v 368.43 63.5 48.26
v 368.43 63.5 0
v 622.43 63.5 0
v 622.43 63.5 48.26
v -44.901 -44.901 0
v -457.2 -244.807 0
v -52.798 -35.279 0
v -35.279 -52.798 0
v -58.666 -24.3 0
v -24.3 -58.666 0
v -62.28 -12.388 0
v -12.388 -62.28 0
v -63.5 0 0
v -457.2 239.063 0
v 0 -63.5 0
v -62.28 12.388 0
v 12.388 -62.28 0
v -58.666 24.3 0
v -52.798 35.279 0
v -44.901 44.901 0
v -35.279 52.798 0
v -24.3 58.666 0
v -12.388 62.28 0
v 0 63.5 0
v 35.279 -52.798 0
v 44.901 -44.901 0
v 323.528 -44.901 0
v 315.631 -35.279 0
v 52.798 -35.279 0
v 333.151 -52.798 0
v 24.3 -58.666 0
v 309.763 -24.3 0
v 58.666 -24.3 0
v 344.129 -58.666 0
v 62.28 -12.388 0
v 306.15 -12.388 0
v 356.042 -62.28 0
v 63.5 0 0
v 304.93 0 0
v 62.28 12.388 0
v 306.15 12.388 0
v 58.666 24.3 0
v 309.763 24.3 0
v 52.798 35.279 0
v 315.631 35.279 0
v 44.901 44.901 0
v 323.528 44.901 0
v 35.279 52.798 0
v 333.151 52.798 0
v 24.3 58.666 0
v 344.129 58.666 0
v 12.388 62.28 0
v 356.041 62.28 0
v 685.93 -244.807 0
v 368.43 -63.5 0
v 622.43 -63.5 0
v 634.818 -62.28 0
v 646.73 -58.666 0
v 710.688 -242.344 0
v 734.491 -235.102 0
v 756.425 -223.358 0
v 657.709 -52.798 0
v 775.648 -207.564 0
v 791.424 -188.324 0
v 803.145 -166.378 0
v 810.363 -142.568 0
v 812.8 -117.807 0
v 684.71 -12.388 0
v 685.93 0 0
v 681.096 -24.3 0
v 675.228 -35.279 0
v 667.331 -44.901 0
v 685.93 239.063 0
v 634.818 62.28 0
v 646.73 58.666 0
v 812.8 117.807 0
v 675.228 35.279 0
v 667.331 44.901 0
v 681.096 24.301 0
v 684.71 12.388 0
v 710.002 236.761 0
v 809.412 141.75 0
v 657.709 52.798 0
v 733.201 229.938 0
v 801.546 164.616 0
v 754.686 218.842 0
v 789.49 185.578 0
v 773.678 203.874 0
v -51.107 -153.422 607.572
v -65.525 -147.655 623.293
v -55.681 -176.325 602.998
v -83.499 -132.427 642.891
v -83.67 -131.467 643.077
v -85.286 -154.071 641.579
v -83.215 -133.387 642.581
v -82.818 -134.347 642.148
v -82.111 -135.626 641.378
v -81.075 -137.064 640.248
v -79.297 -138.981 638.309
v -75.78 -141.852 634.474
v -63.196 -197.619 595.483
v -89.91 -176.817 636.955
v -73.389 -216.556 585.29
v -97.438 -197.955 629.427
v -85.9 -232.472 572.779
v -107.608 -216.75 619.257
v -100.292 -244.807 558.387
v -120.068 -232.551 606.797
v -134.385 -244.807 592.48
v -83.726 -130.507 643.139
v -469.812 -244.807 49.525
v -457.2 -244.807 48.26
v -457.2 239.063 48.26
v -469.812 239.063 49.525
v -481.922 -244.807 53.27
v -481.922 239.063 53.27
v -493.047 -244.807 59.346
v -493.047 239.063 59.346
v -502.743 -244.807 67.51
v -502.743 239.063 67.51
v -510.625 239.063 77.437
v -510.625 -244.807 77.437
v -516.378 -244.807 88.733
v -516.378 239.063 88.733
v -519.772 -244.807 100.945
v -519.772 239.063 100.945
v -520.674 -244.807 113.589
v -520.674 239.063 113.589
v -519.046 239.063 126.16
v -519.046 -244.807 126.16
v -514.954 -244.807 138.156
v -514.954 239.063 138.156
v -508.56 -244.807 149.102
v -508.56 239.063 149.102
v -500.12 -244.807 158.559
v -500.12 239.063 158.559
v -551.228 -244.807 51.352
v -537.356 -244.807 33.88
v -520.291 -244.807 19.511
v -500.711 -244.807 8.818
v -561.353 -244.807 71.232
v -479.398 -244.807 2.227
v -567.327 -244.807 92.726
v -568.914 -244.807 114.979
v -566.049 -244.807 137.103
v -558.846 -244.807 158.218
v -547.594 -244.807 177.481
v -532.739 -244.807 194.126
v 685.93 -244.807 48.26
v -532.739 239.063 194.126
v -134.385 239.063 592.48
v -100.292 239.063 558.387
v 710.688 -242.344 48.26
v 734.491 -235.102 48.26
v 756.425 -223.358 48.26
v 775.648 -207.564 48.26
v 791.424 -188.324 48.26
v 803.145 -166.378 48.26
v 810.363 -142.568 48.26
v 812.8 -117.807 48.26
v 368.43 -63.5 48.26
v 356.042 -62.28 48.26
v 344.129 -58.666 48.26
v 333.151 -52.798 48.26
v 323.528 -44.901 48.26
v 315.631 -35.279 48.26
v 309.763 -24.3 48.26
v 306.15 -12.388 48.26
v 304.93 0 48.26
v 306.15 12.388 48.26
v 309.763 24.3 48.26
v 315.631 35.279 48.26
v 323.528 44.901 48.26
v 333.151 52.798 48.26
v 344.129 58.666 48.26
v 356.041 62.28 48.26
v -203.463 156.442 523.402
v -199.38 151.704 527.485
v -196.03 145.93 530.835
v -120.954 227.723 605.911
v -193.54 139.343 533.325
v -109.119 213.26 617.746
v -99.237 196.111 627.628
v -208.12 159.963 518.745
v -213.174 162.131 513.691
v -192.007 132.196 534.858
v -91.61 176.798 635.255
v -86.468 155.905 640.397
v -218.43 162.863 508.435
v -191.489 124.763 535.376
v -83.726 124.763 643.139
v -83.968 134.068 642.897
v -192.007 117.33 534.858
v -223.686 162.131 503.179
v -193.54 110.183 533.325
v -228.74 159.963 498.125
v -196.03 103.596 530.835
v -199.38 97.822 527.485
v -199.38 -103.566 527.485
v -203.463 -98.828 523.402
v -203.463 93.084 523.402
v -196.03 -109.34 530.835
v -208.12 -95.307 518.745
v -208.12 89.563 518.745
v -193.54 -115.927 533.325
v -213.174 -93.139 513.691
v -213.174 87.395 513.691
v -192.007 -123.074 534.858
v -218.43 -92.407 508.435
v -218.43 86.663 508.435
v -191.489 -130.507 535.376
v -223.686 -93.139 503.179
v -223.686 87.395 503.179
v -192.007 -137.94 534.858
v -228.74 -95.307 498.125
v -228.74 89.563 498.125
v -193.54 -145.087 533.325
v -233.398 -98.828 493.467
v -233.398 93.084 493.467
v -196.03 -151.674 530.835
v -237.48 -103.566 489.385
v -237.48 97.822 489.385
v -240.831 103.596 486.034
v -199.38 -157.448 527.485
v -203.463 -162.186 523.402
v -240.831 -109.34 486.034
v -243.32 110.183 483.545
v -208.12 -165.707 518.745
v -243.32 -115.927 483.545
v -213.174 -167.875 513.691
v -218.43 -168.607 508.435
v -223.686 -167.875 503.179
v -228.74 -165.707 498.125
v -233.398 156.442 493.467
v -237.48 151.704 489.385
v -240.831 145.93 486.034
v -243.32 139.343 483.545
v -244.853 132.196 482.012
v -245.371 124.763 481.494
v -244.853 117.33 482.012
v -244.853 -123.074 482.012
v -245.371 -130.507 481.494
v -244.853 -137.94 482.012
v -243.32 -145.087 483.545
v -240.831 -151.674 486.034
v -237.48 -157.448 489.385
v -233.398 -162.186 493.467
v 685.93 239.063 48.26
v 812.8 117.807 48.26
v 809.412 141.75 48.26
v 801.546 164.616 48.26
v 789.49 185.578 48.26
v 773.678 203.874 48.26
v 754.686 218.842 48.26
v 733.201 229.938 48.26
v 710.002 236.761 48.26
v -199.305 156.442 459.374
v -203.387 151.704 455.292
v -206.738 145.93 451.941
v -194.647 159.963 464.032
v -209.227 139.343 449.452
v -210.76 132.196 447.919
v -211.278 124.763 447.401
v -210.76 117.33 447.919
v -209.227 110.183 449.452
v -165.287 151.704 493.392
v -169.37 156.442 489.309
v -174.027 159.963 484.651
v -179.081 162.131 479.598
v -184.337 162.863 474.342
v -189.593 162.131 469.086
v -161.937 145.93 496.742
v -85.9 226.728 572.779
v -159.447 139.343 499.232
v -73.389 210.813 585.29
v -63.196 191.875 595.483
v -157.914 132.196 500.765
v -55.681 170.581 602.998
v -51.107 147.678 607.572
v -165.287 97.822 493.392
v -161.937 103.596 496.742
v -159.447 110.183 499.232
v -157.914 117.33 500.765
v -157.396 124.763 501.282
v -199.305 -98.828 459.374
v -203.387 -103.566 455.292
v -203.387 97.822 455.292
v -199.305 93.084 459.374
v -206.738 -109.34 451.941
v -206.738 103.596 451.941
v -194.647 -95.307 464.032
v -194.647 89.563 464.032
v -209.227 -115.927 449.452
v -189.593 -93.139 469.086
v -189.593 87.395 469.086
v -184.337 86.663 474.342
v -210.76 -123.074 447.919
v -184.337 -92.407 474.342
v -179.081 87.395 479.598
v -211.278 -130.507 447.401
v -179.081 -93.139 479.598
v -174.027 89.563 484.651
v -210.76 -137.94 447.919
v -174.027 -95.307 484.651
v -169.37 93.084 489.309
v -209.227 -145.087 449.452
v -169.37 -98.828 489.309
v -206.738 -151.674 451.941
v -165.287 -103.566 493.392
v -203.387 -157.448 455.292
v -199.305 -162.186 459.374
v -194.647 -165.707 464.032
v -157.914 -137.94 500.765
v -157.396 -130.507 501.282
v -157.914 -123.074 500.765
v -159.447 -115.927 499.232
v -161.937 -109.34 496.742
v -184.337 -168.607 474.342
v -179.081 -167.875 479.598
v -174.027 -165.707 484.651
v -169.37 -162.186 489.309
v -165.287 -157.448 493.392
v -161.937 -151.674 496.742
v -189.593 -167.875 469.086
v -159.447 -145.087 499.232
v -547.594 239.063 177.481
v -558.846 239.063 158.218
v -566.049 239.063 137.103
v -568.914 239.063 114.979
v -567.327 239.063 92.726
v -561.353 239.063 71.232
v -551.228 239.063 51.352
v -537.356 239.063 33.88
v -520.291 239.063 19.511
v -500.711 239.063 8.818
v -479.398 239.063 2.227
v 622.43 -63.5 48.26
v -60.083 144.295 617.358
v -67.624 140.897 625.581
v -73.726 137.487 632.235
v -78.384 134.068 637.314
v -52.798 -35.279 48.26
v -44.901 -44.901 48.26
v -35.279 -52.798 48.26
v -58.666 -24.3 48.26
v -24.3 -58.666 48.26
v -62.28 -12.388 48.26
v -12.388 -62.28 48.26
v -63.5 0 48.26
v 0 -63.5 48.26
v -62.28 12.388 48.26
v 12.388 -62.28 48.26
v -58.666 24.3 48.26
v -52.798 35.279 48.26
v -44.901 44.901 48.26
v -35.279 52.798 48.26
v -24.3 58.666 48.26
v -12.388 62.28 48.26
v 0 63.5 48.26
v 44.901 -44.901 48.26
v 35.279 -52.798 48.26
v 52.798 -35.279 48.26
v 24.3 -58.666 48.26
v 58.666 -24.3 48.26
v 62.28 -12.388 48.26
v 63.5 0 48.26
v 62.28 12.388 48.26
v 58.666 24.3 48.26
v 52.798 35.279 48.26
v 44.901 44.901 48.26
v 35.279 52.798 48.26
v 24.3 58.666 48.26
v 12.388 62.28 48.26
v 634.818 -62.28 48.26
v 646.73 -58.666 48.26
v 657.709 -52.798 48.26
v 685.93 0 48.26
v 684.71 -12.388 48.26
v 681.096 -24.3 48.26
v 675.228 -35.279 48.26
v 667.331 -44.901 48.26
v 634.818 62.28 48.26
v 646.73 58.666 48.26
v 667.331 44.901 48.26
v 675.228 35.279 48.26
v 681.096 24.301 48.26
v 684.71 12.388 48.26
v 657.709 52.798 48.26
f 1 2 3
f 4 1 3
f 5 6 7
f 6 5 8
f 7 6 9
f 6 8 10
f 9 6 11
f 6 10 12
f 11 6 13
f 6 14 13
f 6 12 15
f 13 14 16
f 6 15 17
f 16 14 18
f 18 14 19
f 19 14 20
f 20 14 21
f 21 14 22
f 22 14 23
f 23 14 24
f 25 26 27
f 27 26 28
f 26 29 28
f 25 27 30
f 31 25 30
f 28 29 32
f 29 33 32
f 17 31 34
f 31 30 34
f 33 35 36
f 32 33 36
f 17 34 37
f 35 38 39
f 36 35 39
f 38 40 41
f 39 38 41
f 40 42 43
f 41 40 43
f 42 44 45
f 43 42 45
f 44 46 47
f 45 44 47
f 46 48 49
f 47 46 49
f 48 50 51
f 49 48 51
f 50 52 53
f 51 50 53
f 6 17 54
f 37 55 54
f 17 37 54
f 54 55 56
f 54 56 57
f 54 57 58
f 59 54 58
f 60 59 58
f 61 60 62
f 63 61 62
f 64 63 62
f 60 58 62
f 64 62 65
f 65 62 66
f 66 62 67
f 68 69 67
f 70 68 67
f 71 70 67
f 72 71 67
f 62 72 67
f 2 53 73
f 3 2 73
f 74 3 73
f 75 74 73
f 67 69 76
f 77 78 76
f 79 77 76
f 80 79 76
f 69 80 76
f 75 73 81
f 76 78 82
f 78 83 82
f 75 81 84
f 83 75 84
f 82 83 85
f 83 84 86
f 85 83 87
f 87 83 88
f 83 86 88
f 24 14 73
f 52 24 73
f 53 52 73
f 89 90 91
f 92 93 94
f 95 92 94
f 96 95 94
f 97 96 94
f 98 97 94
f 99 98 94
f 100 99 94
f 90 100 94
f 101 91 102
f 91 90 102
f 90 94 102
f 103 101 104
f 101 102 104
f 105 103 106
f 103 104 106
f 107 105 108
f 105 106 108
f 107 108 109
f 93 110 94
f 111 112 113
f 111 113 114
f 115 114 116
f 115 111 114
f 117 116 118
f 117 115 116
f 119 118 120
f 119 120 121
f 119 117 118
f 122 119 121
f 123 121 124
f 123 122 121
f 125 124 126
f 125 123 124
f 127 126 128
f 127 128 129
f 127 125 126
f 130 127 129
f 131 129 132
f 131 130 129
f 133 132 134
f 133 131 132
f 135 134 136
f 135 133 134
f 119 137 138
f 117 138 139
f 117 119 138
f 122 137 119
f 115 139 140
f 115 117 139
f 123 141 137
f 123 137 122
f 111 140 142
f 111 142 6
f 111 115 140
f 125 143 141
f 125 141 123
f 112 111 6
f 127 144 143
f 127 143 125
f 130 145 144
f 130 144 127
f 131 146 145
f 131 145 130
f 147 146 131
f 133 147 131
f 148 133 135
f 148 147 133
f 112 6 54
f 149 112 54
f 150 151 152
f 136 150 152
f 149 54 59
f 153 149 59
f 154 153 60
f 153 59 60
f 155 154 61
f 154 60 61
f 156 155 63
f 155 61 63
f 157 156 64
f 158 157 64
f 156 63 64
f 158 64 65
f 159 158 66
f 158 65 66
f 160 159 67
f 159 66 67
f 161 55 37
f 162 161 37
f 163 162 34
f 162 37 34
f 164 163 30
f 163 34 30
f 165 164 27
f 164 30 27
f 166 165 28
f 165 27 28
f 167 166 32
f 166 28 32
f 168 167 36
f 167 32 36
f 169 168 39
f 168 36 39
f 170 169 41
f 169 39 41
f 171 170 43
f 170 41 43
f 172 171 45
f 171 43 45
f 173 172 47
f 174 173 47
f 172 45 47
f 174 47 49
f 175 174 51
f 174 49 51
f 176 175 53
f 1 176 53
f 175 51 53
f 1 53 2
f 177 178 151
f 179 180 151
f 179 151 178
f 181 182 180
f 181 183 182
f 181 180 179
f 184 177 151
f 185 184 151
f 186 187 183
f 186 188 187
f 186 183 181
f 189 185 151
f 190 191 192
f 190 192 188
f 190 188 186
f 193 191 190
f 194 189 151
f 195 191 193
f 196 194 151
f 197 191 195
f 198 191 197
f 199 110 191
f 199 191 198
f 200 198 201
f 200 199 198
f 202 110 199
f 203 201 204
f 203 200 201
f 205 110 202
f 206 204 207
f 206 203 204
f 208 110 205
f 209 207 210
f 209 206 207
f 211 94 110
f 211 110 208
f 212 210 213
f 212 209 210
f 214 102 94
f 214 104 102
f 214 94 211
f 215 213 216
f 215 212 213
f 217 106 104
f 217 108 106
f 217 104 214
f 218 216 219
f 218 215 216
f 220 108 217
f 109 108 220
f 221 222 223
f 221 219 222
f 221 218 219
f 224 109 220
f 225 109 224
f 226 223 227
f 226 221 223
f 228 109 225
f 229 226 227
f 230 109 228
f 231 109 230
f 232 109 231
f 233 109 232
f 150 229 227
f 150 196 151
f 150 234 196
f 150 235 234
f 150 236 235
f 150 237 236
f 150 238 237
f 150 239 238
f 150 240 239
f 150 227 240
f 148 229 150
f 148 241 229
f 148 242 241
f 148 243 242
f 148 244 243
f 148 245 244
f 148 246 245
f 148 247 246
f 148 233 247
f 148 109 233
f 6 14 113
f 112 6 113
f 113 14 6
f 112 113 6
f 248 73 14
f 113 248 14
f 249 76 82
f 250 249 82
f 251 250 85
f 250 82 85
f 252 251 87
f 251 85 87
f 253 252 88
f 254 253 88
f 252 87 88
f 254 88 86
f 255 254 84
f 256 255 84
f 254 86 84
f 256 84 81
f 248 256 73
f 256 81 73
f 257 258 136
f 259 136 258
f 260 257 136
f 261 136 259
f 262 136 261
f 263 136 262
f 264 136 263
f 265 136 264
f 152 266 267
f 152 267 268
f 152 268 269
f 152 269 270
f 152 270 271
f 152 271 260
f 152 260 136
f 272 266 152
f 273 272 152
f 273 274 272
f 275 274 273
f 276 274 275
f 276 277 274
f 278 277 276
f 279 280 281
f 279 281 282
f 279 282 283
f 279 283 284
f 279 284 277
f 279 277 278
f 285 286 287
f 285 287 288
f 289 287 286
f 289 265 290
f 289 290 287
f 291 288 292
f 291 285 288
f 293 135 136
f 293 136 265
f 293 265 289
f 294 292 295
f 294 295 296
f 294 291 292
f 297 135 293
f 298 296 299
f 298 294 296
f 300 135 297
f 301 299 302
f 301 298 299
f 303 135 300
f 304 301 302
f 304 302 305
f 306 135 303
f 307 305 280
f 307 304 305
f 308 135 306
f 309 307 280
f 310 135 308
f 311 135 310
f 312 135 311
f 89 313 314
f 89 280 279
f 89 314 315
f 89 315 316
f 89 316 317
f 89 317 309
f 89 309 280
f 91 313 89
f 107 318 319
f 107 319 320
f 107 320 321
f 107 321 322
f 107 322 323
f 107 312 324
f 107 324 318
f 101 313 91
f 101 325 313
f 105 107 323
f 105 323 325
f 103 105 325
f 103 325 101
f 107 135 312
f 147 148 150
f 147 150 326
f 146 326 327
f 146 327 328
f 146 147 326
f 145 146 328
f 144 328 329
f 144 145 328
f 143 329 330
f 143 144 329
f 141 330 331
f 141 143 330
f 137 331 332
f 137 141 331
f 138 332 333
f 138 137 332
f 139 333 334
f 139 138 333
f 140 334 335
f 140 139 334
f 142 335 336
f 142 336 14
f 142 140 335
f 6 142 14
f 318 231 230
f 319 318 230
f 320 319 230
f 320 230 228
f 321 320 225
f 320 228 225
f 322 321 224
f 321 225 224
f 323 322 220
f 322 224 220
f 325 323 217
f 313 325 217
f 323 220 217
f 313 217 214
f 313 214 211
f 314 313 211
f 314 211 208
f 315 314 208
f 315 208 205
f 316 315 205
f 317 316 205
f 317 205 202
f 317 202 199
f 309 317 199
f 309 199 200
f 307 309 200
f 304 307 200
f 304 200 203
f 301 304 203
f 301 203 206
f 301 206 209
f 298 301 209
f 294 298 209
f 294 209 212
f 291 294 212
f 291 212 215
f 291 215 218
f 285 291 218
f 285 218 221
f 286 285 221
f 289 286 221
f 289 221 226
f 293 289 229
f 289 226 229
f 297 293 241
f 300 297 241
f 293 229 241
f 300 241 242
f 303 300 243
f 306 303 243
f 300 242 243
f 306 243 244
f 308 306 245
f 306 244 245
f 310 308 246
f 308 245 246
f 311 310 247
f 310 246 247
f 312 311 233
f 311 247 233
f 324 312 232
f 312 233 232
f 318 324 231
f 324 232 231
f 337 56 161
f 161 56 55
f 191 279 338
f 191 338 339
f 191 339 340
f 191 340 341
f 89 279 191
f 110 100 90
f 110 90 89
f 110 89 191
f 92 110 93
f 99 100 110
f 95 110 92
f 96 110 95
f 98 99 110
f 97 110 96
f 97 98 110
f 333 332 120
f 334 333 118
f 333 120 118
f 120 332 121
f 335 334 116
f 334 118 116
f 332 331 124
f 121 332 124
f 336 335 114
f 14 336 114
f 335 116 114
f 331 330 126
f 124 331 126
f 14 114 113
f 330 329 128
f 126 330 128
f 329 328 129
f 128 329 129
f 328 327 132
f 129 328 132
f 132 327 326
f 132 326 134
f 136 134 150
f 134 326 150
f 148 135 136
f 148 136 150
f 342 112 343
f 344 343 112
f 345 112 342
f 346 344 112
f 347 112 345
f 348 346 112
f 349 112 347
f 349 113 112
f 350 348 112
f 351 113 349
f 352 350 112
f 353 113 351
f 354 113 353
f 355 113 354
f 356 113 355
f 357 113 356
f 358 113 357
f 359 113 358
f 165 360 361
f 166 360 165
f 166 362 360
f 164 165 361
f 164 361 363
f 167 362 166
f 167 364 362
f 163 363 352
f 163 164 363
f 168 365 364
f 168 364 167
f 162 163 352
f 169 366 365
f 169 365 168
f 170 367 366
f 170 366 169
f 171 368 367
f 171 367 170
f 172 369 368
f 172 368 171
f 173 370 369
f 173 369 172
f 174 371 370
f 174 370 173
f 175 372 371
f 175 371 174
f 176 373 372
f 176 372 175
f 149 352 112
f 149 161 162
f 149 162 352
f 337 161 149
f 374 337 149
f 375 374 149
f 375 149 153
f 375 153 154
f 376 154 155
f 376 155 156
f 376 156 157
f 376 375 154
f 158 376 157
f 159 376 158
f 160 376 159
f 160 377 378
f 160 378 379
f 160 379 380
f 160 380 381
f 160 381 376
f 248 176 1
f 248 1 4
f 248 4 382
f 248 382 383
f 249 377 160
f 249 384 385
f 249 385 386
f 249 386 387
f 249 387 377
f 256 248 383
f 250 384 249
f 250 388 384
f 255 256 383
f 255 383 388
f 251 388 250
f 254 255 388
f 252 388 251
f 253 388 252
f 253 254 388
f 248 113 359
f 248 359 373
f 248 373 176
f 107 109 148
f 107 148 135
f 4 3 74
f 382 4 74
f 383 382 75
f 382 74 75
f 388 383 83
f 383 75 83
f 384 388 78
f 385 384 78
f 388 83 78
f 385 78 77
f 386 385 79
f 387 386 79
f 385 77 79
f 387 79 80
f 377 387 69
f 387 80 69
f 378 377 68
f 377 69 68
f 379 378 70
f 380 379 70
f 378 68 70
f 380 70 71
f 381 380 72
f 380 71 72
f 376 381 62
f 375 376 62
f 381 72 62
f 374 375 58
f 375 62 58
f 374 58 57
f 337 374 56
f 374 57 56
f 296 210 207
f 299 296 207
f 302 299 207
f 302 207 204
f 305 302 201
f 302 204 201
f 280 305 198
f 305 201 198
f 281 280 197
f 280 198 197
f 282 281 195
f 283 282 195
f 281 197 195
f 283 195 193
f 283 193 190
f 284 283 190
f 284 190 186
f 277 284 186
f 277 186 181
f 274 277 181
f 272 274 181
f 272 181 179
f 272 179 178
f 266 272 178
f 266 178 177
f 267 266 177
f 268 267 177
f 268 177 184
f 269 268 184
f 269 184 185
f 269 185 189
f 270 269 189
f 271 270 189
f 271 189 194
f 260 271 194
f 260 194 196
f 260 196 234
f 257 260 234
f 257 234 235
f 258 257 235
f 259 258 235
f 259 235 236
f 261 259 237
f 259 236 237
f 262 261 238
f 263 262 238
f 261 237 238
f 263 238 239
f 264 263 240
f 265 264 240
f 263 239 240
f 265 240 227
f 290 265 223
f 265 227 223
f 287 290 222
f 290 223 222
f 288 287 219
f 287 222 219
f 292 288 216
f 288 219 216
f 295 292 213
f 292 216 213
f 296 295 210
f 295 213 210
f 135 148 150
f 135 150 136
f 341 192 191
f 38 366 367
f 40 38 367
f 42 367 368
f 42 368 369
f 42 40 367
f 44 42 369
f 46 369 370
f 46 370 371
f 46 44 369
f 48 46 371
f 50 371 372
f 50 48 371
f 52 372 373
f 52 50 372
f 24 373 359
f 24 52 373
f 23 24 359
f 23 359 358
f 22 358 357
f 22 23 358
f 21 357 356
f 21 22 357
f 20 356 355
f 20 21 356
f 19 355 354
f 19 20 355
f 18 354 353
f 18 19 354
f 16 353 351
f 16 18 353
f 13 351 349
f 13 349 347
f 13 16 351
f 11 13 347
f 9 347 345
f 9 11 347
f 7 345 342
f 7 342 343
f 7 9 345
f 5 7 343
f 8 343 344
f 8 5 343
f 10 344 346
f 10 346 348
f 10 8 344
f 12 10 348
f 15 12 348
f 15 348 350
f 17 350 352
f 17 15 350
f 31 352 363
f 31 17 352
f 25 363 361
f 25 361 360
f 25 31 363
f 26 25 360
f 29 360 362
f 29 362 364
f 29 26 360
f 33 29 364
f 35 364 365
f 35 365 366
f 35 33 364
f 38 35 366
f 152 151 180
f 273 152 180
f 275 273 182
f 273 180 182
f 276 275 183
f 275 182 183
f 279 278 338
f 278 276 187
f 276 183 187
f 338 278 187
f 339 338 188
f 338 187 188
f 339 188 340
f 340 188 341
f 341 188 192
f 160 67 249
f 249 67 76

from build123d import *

# Parameters (mm, degrees)
F0_R     = 63.5
F1_DEPTH = 48.26
F3_DEPTH = 483.87
F6_DEPTH = 483.87
F7_R     = 38.1
F8_DEPTH = 48.26


# Not quite as in the source:
# - a feature of the source that left no trace in its solid (it failed there, or was rolled back) is left out


with BuildPart() as f1:
    # F0 (on Top) → F1 (new body)
    with BuildSketch(Plane.XY):
        with BuildLine():
            Line((685.9299561556, 239.0631011906), (-457.2, 239.0631011906))
            Line((-457.2, 239.0631011906), (-457.2, -244.8068988094))
            Line((-457.2, -244.8068988094), (685.9299561556, -244.8068988094))
            ThreePointArc((685.9299561556, -244.8068988094), (775.6484959021, -207.5635683113), (812.8, -117.8069653))
            Line((812.8, -117.8069653), (812.8, 117.8069653))
            ThreePointArc((812.8, 117.8069653), (773.6782588688, 203.8739685808), (685.9299561556, 239.0631011906))
        make_face()
        Circle(F0_R, mode=Mode.SUBTRACT)
        with BuildLine():
            ThreePointArc((368.4297373828, -63.5), (304.9297373818, -0.0001093866), (368.4295186092, 63.5))
            Line((368.4295186092, 63.5), (622.4297373818, 63.5))
            ThreePointArc((622.4297373818, 63.5), (685.9299561555, 0.000109387), (622.4299561555, -63.5))
            Line((622.4299561555, -63.5), (368.4297373828, -63.5))
        make_face(mode=Mode.SUBTRACT)
    extrude(amount=F1_DEPTH)


with BuildPart() as f3:
    # F2 (on face) → F3 (new body)
    with BuildSketch(Plane.XZ.offset(244.8068988094)):
        with BuildLine():
            Line((-500.1199795269, 158.55877517), (-532.7391639674, 194.1258442992))
            ThreePointArc((-532.7391639674, 194.1258442992), (-561.3525428371, 71.2316713821), (-457.2, 0))
            Line((-457.2, 0), (-457.2, 48.26))
            ThreePointArc((-457.2, 48.26), (-516.3775811575, 88.732540558), (-500.1199795269, 158.55877517))
        make_face()
    extrude(amount=-F3_DEPTH)


with BuildPart() as f6:
    # F5 (on face) → F6 (new body)
    with BuildSketch(Plane.XZ.offset(244.8068988094)):
        Polygon((-83.7263579139, 643.1386503526), (-532.7391639674, 194.1258442992), (-500.1199795269, 158.55877517), (-51.1071734735, 607.5715812234), align=None)
    extrude(amount=-F6_DEPTH)

    # F7 (on face) → F8 (cut)
    with BuildSketch(Plane(origin=(-363.4325041333, 0, 363.4325041333), x_dir=(0, -1, 0), z_dir=(-0.7071067812, 0, 0.7071067812))):
        with BuildLine():
            Line((244.8068988094, 395.5642254625), (130.5068988094, 395.5642254625))
            ThreePointArc((130.5068988094, 395.5642254625), (197.9551452431, 376.1733981804), (244.8068988094, 323.9222420455))
            Line((244.8068988094, 323.9222420455), (244.8068988094, 395.5642254625))
        make_face()
        with Locations((-124.7631011906, 205.0642254625)):
            Circle(F7_R)
        with Locations((130.5068988094, 205.0642254625)):
            Circle(F7_R)
        with BuildLine():
            Line((-134.0684582131, 395.2228624783), (-124.7631011906, 395.5642254625))
            ThreePointArc((-124.7631011906, 395.5642254625), (-129.4189093375, 395.4788560238), (-134.0684582131, 395.2228624783))
        make_face()
        with BuildLine():
            ThreePointArc((-134.0684582131, 395.2228624783), (-129.4189093375, 395.4788560238), (-124.7631011906, 395.5642254625))
            Line((-124.7631011906, 395.5642254625), (-239.0631011906, 395.5642254625))
            Line((-239.0631011906, 395.5642254625), (-239.0631011906, 323.9222420455))
            ThreePointArc((-239.0631011906, 323.9222420455), (-196.110951121, 373.6284168424), (-134.0684582131, 395.2228624783))
        make_face()
    extrude(amount=-F8_DEPTH, mode=Mode.SUBTRACT)


solid = Compound([f1.part, f3.part, f6.part])
